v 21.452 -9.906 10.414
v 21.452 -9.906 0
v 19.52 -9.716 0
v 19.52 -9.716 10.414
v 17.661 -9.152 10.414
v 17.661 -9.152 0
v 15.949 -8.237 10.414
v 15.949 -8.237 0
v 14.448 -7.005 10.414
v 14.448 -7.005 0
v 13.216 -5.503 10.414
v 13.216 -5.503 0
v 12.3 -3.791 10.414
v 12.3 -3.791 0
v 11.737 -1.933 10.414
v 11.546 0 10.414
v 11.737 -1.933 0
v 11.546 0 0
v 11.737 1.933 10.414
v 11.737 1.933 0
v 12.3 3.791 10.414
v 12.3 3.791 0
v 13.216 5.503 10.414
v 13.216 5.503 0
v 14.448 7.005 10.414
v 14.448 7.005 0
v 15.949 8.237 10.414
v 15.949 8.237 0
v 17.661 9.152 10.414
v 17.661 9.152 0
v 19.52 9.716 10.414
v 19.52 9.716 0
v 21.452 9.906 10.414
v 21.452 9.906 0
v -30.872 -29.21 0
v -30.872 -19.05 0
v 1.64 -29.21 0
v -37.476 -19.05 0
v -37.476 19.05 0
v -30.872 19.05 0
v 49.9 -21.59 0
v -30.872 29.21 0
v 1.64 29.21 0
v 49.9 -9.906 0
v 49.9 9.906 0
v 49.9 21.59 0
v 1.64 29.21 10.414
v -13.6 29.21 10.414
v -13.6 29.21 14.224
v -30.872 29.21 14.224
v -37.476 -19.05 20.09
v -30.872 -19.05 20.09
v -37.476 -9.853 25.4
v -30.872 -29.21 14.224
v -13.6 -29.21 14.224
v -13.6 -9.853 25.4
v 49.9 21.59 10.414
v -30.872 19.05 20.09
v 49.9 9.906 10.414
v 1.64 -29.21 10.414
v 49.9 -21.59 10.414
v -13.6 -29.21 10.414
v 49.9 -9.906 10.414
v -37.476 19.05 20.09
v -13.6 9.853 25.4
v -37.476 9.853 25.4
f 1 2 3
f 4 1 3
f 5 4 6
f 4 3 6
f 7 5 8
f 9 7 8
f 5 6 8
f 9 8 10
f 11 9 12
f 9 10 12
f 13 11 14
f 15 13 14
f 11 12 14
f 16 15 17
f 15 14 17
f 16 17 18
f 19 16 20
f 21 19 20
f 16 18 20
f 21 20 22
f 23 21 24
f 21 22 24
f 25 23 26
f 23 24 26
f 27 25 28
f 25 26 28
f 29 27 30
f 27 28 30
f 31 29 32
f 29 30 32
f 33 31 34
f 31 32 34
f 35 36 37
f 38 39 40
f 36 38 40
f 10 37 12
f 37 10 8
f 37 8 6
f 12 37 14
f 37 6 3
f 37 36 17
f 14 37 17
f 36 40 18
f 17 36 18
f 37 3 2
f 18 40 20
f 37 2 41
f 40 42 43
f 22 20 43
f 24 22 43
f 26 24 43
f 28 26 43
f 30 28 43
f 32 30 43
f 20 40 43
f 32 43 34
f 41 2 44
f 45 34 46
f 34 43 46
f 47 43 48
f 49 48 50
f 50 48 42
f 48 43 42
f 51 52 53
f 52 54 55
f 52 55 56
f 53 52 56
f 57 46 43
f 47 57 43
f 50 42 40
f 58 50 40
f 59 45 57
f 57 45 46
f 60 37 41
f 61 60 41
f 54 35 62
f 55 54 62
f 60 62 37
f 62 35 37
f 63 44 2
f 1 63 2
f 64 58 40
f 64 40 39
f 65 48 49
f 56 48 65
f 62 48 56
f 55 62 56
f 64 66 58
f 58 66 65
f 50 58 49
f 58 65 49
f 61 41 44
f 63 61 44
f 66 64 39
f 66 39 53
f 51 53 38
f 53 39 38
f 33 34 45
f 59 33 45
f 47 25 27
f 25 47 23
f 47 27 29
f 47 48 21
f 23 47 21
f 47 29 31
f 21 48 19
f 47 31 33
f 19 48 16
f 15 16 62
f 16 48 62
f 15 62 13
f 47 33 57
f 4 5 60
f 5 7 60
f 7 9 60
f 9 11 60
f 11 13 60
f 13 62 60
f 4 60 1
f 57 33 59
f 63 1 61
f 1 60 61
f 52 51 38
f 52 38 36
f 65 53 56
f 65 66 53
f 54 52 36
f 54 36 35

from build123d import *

# Parameters (mm, degrees)
F1_DEPTH = 25.4
F2_W     = 15.24
F2_H     = 14.986
F2_W_2   = 48.74875
F3_DEPTH = 76.2
F5_DEPTH = 25.4


with BuildPart() as f1:
    # F0 (on Top) → F1 (new body)
    with BuildSketch(Plane.XY):
        with BuildLine():
            Line((1.640223, 29.21), (-30.871777, 29.21))
            Line((-30.871777, 29.21), (-30.871777, 19.05))
            Line((-30.871777, 19.05), (-37.475777, 19.05))
            Line((-37.475777, 19.05), (-37.475777, -19.05))
            Line((-37.475777, -19.05), (-30.871777, -19.05))
            Line((-30.871777, -19.05), (-30.871777, -29.21))
            Line((-30.871777, -29.21), (1.640223, -29.21))
            Line((1.640223, -29.21), (49.900223, -21.59))
            Line((49.900223, -21.59), (49.900223, -9.906))
            Line((49.900223, -9.906), (21.452223, -9.906))
            ThreePointArc((21.452223, -9.906), (11.546223, 0), (21.452223, 9.906))
            Line((21.452223, 9.906), (49.900223, 9.906))
            Line((49.900223, 9.906), (49.900223, 21.59))
            Line((49.900223, 21.59), (1.640223, 29.21))
        make_face()
    extrude(amount=F1_DEPTH)

    # F2 (on face) → F3 (cut)
    with BuildSketch(Plane.XZ.offset(29.21)):
        with Locations((-5.979777, 17.907)):
            Rectangle(F2_W, F2_H)
        with Locations((26.014598, 17.907)):
            Rectangle(F2_W_2, F2_H)
    extrude(amount=-F3_DEPTH, mode=Mode.SUBTRACT)

    # F4 (on face) → F5 (cut)
    with BuildSketch(Plane.YZ.offset(-13.599777)):
        Polygon((-29.21, 14.224), (-9.8526, 25.4), (-29.21, 25.4), align=None)
        Polygon((29.21, 25.4), (9.8526, 25.4), (29.21, 14.224), align=None)
    extrude(amount=-F5_DEPTH, mode=Mode.SUBTRACT)


solid = f1.part
